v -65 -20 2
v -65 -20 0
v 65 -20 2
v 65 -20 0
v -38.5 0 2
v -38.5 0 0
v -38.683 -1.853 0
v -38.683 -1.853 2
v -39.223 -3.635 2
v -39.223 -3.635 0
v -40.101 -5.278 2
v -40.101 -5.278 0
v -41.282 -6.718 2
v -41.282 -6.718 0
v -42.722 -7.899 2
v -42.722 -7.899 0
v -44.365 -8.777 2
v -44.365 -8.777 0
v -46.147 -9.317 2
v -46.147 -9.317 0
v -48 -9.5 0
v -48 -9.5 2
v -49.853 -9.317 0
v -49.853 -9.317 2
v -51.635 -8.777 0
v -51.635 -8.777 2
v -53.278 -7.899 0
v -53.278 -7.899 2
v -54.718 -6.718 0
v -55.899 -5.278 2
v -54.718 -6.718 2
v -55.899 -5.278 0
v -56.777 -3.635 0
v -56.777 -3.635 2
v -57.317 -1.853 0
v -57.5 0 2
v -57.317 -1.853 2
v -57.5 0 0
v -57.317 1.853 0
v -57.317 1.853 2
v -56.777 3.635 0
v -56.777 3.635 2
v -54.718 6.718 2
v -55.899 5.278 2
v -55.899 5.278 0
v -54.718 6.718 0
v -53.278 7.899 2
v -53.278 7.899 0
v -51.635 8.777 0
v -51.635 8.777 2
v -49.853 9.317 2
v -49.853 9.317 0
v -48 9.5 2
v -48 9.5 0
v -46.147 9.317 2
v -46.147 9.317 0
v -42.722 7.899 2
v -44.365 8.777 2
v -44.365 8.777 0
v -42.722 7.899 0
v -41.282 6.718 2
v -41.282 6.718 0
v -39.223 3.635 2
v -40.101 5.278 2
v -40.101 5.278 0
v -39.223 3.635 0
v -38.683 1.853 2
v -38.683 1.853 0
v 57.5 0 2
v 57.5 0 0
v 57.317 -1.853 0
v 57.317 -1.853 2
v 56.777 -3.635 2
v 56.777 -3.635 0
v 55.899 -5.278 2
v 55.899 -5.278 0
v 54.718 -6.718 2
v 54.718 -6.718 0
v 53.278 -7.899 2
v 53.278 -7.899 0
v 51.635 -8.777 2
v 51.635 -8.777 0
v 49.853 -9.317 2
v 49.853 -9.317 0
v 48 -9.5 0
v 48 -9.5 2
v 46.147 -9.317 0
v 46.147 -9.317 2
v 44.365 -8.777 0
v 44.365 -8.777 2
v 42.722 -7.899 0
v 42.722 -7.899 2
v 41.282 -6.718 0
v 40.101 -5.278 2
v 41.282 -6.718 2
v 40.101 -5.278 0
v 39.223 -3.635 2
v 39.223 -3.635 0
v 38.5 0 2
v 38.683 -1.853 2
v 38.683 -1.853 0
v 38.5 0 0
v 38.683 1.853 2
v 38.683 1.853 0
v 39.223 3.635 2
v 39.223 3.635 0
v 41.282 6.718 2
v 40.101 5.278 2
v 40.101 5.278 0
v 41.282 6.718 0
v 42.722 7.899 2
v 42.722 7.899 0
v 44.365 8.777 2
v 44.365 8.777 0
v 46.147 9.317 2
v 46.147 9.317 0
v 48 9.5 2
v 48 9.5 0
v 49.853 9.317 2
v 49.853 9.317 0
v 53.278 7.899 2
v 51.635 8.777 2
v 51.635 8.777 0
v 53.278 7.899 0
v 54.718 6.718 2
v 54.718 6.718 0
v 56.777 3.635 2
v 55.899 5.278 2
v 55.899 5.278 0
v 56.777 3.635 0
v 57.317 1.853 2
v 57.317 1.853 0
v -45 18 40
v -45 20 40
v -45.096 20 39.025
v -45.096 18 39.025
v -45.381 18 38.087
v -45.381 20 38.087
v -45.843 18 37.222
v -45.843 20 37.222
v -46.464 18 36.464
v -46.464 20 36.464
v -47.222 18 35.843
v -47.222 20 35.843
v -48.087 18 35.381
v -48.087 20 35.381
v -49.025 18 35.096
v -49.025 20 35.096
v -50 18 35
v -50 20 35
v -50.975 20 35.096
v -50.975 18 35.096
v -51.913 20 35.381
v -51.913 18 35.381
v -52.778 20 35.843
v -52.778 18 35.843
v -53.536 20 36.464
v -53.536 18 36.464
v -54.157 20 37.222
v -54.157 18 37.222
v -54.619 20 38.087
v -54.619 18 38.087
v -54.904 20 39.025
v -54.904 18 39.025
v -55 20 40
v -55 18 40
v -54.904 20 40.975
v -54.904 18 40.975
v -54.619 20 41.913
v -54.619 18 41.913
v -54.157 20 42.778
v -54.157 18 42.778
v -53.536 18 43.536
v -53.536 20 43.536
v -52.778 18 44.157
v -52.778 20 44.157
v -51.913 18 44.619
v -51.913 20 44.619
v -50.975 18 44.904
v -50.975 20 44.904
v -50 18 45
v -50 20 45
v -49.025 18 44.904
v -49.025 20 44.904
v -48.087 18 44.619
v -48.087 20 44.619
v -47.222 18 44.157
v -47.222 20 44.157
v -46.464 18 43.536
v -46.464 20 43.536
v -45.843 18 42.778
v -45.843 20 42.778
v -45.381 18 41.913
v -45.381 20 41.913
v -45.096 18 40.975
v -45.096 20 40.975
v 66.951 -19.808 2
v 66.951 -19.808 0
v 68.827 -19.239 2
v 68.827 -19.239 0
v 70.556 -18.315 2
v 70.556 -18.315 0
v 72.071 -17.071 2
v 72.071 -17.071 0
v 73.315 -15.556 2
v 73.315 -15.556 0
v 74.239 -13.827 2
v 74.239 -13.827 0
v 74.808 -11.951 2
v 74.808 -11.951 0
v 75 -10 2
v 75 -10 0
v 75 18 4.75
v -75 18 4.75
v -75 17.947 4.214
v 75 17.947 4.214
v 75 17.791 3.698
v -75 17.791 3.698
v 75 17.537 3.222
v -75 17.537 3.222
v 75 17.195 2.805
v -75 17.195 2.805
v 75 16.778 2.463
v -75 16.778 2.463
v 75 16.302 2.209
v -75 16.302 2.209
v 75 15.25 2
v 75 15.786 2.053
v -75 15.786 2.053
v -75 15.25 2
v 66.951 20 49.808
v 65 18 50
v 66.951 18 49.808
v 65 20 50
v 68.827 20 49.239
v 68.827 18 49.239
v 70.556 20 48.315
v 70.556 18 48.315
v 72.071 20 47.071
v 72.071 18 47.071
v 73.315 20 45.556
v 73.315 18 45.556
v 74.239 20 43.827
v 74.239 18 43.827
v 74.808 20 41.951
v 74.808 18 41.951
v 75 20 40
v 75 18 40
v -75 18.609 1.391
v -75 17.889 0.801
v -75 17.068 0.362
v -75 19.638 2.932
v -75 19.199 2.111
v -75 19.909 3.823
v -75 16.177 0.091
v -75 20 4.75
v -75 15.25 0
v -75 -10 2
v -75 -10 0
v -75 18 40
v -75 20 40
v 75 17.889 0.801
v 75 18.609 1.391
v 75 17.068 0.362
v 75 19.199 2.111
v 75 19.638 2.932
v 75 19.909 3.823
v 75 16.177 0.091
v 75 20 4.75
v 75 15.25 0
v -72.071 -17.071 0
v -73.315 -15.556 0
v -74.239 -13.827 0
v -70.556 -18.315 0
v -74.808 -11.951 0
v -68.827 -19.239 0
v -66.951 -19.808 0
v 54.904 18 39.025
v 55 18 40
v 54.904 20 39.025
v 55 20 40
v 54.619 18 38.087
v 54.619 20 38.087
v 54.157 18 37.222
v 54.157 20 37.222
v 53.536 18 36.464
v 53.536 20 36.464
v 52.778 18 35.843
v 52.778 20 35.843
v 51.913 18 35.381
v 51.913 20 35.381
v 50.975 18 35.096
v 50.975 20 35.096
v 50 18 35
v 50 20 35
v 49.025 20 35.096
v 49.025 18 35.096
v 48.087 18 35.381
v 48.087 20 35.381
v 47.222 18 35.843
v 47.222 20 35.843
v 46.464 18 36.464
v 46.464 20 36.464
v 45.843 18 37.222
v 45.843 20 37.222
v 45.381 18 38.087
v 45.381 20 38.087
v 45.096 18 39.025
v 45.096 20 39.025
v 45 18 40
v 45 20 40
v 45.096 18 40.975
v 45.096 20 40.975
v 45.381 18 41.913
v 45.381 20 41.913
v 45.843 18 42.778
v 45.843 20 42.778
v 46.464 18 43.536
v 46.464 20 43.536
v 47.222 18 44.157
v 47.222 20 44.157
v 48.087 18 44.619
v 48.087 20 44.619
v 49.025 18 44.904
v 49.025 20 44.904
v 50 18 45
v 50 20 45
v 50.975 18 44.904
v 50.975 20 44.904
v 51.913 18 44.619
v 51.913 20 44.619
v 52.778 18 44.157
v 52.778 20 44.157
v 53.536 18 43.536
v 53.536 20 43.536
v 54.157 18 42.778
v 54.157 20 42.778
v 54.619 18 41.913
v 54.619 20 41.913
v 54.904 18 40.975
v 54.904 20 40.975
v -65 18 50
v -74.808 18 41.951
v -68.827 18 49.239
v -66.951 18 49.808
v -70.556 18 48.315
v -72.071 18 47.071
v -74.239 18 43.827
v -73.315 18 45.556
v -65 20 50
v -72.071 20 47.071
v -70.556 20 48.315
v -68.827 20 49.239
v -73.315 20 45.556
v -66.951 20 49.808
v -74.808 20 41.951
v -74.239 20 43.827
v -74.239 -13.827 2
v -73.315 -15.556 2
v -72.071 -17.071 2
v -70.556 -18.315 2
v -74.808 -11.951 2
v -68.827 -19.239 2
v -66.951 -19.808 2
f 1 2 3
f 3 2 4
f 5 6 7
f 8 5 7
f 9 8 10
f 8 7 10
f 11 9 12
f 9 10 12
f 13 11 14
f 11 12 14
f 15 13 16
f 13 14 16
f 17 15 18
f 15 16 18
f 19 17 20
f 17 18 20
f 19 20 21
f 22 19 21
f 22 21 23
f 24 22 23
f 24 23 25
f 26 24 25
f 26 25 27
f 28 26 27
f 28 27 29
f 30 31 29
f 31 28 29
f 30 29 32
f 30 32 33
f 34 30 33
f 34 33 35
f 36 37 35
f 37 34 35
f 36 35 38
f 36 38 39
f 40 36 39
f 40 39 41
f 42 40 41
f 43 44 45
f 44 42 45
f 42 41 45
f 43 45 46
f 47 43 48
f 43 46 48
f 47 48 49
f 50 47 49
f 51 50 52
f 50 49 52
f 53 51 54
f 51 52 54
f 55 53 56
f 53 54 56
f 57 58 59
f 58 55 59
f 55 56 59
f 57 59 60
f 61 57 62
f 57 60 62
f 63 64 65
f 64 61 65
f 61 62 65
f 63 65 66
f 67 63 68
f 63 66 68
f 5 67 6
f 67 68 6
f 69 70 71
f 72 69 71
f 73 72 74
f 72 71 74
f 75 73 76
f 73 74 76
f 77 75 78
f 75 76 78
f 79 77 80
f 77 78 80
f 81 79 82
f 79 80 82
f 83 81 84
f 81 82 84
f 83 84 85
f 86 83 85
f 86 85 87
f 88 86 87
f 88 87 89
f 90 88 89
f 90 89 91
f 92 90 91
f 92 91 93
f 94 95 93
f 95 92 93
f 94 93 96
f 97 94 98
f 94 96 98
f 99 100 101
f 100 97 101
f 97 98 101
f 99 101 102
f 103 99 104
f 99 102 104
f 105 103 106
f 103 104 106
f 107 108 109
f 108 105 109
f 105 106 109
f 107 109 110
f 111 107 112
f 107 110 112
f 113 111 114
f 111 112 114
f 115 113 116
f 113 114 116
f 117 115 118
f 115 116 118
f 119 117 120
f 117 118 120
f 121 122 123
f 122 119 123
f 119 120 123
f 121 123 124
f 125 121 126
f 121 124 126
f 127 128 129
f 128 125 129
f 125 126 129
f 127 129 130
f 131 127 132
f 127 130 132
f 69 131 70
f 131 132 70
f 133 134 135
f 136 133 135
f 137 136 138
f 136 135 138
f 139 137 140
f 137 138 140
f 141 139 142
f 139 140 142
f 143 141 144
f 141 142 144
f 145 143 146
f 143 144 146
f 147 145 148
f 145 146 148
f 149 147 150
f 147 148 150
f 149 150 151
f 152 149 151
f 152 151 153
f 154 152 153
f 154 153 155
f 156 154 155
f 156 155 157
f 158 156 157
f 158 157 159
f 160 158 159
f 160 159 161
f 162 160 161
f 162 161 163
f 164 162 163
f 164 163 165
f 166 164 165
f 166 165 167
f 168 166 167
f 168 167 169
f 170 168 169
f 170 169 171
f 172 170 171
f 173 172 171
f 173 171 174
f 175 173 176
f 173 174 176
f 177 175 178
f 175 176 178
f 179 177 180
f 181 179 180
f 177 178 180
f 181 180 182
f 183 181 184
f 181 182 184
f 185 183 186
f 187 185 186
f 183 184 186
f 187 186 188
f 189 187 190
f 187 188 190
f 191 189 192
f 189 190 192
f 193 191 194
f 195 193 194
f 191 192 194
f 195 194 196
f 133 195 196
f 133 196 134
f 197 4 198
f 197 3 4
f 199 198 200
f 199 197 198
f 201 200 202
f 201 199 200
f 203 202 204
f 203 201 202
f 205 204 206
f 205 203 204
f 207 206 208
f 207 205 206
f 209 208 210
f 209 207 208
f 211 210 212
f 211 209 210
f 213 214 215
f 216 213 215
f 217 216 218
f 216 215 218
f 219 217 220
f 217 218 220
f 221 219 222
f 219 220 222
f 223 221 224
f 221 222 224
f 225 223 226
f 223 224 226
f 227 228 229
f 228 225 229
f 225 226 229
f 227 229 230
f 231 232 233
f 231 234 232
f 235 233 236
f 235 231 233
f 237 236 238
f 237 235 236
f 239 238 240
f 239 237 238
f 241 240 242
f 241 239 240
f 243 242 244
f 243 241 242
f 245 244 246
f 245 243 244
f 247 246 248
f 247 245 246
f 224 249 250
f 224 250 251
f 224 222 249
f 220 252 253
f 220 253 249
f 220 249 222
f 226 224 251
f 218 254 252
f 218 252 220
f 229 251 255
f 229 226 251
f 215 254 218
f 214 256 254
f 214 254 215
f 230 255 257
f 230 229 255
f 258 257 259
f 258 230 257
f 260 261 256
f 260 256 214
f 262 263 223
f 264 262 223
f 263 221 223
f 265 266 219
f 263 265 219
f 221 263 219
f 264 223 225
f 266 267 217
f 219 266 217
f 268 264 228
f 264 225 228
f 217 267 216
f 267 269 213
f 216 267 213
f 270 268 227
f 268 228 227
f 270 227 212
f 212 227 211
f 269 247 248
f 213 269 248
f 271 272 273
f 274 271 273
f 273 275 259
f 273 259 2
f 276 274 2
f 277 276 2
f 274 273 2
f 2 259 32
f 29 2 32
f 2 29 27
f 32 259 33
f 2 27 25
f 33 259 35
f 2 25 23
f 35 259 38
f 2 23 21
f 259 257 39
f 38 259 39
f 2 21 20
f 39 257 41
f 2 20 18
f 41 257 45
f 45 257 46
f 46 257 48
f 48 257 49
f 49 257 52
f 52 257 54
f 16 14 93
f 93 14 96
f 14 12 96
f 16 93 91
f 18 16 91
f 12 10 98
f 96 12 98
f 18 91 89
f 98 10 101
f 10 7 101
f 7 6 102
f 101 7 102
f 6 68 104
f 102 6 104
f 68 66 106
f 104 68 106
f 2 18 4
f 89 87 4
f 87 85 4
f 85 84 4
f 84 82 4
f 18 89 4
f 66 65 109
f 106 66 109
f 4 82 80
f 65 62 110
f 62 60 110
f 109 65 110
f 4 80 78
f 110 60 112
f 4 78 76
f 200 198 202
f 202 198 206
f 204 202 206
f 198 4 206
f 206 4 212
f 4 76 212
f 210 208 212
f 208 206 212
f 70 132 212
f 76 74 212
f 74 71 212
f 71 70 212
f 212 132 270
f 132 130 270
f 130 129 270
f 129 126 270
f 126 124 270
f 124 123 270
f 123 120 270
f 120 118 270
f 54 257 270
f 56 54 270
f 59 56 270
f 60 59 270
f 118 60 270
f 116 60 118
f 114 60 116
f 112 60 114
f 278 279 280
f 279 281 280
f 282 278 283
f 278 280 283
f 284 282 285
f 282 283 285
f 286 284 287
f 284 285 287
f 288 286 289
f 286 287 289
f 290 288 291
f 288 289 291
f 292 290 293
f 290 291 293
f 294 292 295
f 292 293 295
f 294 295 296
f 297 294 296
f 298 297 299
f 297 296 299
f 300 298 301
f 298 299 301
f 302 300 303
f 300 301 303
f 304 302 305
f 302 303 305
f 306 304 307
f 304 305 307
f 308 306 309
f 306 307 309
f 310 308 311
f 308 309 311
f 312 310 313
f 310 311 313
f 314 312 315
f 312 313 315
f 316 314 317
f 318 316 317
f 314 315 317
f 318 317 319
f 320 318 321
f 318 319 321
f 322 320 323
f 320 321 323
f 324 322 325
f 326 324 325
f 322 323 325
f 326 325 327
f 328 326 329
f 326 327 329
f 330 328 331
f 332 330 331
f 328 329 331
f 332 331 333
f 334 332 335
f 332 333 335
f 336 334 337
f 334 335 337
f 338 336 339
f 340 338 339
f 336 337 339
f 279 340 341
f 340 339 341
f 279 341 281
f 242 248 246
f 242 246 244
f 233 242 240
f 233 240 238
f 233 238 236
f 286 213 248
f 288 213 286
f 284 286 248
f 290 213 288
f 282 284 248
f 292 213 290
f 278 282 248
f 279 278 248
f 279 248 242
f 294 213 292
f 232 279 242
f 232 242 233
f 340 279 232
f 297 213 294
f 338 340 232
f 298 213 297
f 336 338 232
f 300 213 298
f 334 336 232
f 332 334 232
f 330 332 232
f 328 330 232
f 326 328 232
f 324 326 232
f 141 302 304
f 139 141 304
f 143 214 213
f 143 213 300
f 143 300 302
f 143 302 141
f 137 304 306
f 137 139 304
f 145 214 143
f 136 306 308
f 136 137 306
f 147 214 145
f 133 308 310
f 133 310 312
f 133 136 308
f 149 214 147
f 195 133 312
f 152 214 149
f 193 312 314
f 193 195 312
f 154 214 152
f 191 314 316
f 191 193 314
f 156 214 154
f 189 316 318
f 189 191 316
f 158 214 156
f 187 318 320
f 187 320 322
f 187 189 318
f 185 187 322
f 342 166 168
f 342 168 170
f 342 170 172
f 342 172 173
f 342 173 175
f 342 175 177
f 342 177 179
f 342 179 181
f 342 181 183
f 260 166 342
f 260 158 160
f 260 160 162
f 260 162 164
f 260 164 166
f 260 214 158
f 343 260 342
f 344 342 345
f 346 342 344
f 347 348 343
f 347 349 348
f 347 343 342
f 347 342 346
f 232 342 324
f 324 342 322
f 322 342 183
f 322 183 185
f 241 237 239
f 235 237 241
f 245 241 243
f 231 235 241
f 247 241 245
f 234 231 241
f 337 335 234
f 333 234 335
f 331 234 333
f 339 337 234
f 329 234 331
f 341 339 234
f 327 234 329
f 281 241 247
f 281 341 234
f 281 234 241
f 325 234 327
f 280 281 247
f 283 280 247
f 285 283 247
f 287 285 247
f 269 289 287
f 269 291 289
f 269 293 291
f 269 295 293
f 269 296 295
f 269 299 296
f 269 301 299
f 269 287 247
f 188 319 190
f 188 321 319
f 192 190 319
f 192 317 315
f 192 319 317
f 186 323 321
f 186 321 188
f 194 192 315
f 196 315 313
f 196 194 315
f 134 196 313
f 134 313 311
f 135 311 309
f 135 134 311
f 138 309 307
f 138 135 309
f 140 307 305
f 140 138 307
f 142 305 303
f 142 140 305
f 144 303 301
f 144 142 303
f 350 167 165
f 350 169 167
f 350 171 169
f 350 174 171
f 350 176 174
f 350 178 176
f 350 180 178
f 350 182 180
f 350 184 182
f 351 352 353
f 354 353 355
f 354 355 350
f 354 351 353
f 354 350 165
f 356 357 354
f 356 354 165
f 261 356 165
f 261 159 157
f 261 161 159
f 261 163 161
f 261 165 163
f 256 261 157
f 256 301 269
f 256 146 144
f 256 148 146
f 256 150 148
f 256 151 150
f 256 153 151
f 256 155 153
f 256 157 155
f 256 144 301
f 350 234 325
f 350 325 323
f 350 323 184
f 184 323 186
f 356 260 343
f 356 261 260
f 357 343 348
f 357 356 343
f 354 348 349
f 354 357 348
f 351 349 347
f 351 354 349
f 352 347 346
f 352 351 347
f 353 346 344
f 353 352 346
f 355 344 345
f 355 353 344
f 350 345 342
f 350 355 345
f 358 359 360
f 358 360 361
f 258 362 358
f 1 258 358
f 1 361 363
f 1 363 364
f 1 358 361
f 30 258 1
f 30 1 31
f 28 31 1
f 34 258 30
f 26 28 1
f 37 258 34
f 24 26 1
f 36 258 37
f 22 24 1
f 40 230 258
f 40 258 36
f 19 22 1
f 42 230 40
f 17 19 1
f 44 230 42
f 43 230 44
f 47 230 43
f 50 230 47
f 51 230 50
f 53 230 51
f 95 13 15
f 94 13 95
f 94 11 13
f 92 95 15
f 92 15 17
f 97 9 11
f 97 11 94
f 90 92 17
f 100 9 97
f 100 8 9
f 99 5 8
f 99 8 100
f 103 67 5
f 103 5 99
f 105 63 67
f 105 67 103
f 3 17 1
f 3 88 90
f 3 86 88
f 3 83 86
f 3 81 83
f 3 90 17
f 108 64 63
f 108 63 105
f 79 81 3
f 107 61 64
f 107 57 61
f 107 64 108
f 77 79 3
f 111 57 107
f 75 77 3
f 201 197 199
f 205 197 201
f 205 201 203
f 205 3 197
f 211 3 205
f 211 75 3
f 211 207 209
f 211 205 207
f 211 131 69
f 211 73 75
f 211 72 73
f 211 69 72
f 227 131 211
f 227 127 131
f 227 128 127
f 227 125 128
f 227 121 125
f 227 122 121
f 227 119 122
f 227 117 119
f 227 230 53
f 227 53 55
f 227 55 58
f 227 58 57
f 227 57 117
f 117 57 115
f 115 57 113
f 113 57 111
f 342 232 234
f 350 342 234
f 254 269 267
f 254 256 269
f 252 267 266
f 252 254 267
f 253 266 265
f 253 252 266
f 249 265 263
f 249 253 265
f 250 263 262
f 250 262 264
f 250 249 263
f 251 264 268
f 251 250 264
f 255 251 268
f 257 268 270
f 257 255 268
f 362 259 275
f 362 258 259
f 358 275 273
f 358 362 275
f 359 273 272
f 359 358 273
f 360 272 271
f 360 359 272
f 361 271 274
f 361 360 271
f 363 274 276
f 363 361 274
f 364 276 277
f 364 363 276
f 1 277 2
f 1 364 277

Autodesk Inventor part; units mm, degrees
ref_plane "YZ Plane" through (0, 0, 0) normal (1, 0, 0) x (0, 1, 0)
ref_plane "XZ Plane" through (0, 0, 0) normal (0, 1, 0) x (-1, 0, 0)
ref_plane "XY Plane" through (0, 0, 0) normal (0, 0, 1) x (1, 0, 0)
sketch "Sketch1" plane through (0, 0, 0) normal (0, 0, 1) x (1, 0, 0)
  line L0 (-75, -20) -> (75, -20)
  line L1 (75, -20) -> (75, 20)
  line L2 (75, 20) -> (-75, 20)
  line L3 (-75, 20) -> (-75, -20)
  line L4 (-75, -20) -> (75, 20) construction
  line L5 (75, -20) -> (-75, 20) construction
  circle A0 centre (-48, 0) radius 9.5
  circle A1 centre (48, 0) radius 9.5
  line L6 (0, 20) -> (0, -20) construction
  point P0 (0, 0)
  point P1 (0, 0)
  dimension "d0" = 150
  dimension "d1" = 40
  dimension "d6" = 19
  dimension "d7" = 96
extrude "Plate1" add sketch "Sketch1" along normal blind 2
sketch "Sketch3" plane through (-75, 18, 0) normal (0, 1, 0) x (-1, 0, 0)
  line L0 (-150, 0) -> (0, 0)
  line L1 (0, 0) -> (0, 50)
  line L2 (0, 50) -> (-150, 50)
  line L3 (-150, 50) -> (-150, 0)
edge flange "Flange1" height 50 angle 90 thickness 2 bend radius 2.75 thickness toward (0, 1, 0) relief round relief width 2 relief depth 1 edges at (0, 20, 2) wall of the first edge with corners at (75, 18, 0) (-75, 18, 0) (-75, 18, 50) (75, 18, 50)
bend "Bend1"
corner "Corner1"
sketch "Sketch4" plane through (-75, 20, 50) normal (0, 1, 0) x (1, 0, 0)
  circle A0 centre (25, 10) radius 5
  circle A1 centre (125, 10) radius 5
  line L0 (150, 0) -> (0, 0) construction
  line L1 (75, 0) -> (75, 50) construction
  line L2 (150, 48) -> (0, 48) construction
  dimension "d18" = 10
  dimension "d19" = 10
  dimension "d20" = 100
extrude "Cut1" cut sketch "Sketch4" against normal blind 2
fillet "Corner Round1" radius 10 4 edges at (75, 19, 50) (-75, -20, 1) (-75, 19, 50) (75, -20, 1)
equation "\"d21\" = Thickness"
equation "\"d2\" = Thickness"
equation "\"d8\" = BendReliefWidth"
equation "\"d9\" = BendReliefDepth"
equation "\"d10\" = MinimumRemnant"
equation "\"d11\" = TransitionRadius"
equation "\"d14\" = BendRadius"
equation "\"d15\" = CornerReliefSize"
equation "\"d16\" = GapSize"
equation "\"d17\" = JacobiRadiusSize"
equation "\"BendReliefWidth\" = Thickness"
equation "\"BendReliefDepth\" = 0.5 * Thickness"
equation "\"CornerReliefSize\" = 4 * Thickness"
equation "\"MinimumRemnant\" = 2 * Thickness"
equation "\"TransitionRadius\" = BendRadius"
equation "\"JacobiRadiusSize\" = BendRadius"
equation "\"GapSize\" = Thickness"
equation "\"Thickness\" = 2"
equation "\"BendRadius\" = 2.75"
properties part number "Goat_roller_supp" material "Stainless Steel"
